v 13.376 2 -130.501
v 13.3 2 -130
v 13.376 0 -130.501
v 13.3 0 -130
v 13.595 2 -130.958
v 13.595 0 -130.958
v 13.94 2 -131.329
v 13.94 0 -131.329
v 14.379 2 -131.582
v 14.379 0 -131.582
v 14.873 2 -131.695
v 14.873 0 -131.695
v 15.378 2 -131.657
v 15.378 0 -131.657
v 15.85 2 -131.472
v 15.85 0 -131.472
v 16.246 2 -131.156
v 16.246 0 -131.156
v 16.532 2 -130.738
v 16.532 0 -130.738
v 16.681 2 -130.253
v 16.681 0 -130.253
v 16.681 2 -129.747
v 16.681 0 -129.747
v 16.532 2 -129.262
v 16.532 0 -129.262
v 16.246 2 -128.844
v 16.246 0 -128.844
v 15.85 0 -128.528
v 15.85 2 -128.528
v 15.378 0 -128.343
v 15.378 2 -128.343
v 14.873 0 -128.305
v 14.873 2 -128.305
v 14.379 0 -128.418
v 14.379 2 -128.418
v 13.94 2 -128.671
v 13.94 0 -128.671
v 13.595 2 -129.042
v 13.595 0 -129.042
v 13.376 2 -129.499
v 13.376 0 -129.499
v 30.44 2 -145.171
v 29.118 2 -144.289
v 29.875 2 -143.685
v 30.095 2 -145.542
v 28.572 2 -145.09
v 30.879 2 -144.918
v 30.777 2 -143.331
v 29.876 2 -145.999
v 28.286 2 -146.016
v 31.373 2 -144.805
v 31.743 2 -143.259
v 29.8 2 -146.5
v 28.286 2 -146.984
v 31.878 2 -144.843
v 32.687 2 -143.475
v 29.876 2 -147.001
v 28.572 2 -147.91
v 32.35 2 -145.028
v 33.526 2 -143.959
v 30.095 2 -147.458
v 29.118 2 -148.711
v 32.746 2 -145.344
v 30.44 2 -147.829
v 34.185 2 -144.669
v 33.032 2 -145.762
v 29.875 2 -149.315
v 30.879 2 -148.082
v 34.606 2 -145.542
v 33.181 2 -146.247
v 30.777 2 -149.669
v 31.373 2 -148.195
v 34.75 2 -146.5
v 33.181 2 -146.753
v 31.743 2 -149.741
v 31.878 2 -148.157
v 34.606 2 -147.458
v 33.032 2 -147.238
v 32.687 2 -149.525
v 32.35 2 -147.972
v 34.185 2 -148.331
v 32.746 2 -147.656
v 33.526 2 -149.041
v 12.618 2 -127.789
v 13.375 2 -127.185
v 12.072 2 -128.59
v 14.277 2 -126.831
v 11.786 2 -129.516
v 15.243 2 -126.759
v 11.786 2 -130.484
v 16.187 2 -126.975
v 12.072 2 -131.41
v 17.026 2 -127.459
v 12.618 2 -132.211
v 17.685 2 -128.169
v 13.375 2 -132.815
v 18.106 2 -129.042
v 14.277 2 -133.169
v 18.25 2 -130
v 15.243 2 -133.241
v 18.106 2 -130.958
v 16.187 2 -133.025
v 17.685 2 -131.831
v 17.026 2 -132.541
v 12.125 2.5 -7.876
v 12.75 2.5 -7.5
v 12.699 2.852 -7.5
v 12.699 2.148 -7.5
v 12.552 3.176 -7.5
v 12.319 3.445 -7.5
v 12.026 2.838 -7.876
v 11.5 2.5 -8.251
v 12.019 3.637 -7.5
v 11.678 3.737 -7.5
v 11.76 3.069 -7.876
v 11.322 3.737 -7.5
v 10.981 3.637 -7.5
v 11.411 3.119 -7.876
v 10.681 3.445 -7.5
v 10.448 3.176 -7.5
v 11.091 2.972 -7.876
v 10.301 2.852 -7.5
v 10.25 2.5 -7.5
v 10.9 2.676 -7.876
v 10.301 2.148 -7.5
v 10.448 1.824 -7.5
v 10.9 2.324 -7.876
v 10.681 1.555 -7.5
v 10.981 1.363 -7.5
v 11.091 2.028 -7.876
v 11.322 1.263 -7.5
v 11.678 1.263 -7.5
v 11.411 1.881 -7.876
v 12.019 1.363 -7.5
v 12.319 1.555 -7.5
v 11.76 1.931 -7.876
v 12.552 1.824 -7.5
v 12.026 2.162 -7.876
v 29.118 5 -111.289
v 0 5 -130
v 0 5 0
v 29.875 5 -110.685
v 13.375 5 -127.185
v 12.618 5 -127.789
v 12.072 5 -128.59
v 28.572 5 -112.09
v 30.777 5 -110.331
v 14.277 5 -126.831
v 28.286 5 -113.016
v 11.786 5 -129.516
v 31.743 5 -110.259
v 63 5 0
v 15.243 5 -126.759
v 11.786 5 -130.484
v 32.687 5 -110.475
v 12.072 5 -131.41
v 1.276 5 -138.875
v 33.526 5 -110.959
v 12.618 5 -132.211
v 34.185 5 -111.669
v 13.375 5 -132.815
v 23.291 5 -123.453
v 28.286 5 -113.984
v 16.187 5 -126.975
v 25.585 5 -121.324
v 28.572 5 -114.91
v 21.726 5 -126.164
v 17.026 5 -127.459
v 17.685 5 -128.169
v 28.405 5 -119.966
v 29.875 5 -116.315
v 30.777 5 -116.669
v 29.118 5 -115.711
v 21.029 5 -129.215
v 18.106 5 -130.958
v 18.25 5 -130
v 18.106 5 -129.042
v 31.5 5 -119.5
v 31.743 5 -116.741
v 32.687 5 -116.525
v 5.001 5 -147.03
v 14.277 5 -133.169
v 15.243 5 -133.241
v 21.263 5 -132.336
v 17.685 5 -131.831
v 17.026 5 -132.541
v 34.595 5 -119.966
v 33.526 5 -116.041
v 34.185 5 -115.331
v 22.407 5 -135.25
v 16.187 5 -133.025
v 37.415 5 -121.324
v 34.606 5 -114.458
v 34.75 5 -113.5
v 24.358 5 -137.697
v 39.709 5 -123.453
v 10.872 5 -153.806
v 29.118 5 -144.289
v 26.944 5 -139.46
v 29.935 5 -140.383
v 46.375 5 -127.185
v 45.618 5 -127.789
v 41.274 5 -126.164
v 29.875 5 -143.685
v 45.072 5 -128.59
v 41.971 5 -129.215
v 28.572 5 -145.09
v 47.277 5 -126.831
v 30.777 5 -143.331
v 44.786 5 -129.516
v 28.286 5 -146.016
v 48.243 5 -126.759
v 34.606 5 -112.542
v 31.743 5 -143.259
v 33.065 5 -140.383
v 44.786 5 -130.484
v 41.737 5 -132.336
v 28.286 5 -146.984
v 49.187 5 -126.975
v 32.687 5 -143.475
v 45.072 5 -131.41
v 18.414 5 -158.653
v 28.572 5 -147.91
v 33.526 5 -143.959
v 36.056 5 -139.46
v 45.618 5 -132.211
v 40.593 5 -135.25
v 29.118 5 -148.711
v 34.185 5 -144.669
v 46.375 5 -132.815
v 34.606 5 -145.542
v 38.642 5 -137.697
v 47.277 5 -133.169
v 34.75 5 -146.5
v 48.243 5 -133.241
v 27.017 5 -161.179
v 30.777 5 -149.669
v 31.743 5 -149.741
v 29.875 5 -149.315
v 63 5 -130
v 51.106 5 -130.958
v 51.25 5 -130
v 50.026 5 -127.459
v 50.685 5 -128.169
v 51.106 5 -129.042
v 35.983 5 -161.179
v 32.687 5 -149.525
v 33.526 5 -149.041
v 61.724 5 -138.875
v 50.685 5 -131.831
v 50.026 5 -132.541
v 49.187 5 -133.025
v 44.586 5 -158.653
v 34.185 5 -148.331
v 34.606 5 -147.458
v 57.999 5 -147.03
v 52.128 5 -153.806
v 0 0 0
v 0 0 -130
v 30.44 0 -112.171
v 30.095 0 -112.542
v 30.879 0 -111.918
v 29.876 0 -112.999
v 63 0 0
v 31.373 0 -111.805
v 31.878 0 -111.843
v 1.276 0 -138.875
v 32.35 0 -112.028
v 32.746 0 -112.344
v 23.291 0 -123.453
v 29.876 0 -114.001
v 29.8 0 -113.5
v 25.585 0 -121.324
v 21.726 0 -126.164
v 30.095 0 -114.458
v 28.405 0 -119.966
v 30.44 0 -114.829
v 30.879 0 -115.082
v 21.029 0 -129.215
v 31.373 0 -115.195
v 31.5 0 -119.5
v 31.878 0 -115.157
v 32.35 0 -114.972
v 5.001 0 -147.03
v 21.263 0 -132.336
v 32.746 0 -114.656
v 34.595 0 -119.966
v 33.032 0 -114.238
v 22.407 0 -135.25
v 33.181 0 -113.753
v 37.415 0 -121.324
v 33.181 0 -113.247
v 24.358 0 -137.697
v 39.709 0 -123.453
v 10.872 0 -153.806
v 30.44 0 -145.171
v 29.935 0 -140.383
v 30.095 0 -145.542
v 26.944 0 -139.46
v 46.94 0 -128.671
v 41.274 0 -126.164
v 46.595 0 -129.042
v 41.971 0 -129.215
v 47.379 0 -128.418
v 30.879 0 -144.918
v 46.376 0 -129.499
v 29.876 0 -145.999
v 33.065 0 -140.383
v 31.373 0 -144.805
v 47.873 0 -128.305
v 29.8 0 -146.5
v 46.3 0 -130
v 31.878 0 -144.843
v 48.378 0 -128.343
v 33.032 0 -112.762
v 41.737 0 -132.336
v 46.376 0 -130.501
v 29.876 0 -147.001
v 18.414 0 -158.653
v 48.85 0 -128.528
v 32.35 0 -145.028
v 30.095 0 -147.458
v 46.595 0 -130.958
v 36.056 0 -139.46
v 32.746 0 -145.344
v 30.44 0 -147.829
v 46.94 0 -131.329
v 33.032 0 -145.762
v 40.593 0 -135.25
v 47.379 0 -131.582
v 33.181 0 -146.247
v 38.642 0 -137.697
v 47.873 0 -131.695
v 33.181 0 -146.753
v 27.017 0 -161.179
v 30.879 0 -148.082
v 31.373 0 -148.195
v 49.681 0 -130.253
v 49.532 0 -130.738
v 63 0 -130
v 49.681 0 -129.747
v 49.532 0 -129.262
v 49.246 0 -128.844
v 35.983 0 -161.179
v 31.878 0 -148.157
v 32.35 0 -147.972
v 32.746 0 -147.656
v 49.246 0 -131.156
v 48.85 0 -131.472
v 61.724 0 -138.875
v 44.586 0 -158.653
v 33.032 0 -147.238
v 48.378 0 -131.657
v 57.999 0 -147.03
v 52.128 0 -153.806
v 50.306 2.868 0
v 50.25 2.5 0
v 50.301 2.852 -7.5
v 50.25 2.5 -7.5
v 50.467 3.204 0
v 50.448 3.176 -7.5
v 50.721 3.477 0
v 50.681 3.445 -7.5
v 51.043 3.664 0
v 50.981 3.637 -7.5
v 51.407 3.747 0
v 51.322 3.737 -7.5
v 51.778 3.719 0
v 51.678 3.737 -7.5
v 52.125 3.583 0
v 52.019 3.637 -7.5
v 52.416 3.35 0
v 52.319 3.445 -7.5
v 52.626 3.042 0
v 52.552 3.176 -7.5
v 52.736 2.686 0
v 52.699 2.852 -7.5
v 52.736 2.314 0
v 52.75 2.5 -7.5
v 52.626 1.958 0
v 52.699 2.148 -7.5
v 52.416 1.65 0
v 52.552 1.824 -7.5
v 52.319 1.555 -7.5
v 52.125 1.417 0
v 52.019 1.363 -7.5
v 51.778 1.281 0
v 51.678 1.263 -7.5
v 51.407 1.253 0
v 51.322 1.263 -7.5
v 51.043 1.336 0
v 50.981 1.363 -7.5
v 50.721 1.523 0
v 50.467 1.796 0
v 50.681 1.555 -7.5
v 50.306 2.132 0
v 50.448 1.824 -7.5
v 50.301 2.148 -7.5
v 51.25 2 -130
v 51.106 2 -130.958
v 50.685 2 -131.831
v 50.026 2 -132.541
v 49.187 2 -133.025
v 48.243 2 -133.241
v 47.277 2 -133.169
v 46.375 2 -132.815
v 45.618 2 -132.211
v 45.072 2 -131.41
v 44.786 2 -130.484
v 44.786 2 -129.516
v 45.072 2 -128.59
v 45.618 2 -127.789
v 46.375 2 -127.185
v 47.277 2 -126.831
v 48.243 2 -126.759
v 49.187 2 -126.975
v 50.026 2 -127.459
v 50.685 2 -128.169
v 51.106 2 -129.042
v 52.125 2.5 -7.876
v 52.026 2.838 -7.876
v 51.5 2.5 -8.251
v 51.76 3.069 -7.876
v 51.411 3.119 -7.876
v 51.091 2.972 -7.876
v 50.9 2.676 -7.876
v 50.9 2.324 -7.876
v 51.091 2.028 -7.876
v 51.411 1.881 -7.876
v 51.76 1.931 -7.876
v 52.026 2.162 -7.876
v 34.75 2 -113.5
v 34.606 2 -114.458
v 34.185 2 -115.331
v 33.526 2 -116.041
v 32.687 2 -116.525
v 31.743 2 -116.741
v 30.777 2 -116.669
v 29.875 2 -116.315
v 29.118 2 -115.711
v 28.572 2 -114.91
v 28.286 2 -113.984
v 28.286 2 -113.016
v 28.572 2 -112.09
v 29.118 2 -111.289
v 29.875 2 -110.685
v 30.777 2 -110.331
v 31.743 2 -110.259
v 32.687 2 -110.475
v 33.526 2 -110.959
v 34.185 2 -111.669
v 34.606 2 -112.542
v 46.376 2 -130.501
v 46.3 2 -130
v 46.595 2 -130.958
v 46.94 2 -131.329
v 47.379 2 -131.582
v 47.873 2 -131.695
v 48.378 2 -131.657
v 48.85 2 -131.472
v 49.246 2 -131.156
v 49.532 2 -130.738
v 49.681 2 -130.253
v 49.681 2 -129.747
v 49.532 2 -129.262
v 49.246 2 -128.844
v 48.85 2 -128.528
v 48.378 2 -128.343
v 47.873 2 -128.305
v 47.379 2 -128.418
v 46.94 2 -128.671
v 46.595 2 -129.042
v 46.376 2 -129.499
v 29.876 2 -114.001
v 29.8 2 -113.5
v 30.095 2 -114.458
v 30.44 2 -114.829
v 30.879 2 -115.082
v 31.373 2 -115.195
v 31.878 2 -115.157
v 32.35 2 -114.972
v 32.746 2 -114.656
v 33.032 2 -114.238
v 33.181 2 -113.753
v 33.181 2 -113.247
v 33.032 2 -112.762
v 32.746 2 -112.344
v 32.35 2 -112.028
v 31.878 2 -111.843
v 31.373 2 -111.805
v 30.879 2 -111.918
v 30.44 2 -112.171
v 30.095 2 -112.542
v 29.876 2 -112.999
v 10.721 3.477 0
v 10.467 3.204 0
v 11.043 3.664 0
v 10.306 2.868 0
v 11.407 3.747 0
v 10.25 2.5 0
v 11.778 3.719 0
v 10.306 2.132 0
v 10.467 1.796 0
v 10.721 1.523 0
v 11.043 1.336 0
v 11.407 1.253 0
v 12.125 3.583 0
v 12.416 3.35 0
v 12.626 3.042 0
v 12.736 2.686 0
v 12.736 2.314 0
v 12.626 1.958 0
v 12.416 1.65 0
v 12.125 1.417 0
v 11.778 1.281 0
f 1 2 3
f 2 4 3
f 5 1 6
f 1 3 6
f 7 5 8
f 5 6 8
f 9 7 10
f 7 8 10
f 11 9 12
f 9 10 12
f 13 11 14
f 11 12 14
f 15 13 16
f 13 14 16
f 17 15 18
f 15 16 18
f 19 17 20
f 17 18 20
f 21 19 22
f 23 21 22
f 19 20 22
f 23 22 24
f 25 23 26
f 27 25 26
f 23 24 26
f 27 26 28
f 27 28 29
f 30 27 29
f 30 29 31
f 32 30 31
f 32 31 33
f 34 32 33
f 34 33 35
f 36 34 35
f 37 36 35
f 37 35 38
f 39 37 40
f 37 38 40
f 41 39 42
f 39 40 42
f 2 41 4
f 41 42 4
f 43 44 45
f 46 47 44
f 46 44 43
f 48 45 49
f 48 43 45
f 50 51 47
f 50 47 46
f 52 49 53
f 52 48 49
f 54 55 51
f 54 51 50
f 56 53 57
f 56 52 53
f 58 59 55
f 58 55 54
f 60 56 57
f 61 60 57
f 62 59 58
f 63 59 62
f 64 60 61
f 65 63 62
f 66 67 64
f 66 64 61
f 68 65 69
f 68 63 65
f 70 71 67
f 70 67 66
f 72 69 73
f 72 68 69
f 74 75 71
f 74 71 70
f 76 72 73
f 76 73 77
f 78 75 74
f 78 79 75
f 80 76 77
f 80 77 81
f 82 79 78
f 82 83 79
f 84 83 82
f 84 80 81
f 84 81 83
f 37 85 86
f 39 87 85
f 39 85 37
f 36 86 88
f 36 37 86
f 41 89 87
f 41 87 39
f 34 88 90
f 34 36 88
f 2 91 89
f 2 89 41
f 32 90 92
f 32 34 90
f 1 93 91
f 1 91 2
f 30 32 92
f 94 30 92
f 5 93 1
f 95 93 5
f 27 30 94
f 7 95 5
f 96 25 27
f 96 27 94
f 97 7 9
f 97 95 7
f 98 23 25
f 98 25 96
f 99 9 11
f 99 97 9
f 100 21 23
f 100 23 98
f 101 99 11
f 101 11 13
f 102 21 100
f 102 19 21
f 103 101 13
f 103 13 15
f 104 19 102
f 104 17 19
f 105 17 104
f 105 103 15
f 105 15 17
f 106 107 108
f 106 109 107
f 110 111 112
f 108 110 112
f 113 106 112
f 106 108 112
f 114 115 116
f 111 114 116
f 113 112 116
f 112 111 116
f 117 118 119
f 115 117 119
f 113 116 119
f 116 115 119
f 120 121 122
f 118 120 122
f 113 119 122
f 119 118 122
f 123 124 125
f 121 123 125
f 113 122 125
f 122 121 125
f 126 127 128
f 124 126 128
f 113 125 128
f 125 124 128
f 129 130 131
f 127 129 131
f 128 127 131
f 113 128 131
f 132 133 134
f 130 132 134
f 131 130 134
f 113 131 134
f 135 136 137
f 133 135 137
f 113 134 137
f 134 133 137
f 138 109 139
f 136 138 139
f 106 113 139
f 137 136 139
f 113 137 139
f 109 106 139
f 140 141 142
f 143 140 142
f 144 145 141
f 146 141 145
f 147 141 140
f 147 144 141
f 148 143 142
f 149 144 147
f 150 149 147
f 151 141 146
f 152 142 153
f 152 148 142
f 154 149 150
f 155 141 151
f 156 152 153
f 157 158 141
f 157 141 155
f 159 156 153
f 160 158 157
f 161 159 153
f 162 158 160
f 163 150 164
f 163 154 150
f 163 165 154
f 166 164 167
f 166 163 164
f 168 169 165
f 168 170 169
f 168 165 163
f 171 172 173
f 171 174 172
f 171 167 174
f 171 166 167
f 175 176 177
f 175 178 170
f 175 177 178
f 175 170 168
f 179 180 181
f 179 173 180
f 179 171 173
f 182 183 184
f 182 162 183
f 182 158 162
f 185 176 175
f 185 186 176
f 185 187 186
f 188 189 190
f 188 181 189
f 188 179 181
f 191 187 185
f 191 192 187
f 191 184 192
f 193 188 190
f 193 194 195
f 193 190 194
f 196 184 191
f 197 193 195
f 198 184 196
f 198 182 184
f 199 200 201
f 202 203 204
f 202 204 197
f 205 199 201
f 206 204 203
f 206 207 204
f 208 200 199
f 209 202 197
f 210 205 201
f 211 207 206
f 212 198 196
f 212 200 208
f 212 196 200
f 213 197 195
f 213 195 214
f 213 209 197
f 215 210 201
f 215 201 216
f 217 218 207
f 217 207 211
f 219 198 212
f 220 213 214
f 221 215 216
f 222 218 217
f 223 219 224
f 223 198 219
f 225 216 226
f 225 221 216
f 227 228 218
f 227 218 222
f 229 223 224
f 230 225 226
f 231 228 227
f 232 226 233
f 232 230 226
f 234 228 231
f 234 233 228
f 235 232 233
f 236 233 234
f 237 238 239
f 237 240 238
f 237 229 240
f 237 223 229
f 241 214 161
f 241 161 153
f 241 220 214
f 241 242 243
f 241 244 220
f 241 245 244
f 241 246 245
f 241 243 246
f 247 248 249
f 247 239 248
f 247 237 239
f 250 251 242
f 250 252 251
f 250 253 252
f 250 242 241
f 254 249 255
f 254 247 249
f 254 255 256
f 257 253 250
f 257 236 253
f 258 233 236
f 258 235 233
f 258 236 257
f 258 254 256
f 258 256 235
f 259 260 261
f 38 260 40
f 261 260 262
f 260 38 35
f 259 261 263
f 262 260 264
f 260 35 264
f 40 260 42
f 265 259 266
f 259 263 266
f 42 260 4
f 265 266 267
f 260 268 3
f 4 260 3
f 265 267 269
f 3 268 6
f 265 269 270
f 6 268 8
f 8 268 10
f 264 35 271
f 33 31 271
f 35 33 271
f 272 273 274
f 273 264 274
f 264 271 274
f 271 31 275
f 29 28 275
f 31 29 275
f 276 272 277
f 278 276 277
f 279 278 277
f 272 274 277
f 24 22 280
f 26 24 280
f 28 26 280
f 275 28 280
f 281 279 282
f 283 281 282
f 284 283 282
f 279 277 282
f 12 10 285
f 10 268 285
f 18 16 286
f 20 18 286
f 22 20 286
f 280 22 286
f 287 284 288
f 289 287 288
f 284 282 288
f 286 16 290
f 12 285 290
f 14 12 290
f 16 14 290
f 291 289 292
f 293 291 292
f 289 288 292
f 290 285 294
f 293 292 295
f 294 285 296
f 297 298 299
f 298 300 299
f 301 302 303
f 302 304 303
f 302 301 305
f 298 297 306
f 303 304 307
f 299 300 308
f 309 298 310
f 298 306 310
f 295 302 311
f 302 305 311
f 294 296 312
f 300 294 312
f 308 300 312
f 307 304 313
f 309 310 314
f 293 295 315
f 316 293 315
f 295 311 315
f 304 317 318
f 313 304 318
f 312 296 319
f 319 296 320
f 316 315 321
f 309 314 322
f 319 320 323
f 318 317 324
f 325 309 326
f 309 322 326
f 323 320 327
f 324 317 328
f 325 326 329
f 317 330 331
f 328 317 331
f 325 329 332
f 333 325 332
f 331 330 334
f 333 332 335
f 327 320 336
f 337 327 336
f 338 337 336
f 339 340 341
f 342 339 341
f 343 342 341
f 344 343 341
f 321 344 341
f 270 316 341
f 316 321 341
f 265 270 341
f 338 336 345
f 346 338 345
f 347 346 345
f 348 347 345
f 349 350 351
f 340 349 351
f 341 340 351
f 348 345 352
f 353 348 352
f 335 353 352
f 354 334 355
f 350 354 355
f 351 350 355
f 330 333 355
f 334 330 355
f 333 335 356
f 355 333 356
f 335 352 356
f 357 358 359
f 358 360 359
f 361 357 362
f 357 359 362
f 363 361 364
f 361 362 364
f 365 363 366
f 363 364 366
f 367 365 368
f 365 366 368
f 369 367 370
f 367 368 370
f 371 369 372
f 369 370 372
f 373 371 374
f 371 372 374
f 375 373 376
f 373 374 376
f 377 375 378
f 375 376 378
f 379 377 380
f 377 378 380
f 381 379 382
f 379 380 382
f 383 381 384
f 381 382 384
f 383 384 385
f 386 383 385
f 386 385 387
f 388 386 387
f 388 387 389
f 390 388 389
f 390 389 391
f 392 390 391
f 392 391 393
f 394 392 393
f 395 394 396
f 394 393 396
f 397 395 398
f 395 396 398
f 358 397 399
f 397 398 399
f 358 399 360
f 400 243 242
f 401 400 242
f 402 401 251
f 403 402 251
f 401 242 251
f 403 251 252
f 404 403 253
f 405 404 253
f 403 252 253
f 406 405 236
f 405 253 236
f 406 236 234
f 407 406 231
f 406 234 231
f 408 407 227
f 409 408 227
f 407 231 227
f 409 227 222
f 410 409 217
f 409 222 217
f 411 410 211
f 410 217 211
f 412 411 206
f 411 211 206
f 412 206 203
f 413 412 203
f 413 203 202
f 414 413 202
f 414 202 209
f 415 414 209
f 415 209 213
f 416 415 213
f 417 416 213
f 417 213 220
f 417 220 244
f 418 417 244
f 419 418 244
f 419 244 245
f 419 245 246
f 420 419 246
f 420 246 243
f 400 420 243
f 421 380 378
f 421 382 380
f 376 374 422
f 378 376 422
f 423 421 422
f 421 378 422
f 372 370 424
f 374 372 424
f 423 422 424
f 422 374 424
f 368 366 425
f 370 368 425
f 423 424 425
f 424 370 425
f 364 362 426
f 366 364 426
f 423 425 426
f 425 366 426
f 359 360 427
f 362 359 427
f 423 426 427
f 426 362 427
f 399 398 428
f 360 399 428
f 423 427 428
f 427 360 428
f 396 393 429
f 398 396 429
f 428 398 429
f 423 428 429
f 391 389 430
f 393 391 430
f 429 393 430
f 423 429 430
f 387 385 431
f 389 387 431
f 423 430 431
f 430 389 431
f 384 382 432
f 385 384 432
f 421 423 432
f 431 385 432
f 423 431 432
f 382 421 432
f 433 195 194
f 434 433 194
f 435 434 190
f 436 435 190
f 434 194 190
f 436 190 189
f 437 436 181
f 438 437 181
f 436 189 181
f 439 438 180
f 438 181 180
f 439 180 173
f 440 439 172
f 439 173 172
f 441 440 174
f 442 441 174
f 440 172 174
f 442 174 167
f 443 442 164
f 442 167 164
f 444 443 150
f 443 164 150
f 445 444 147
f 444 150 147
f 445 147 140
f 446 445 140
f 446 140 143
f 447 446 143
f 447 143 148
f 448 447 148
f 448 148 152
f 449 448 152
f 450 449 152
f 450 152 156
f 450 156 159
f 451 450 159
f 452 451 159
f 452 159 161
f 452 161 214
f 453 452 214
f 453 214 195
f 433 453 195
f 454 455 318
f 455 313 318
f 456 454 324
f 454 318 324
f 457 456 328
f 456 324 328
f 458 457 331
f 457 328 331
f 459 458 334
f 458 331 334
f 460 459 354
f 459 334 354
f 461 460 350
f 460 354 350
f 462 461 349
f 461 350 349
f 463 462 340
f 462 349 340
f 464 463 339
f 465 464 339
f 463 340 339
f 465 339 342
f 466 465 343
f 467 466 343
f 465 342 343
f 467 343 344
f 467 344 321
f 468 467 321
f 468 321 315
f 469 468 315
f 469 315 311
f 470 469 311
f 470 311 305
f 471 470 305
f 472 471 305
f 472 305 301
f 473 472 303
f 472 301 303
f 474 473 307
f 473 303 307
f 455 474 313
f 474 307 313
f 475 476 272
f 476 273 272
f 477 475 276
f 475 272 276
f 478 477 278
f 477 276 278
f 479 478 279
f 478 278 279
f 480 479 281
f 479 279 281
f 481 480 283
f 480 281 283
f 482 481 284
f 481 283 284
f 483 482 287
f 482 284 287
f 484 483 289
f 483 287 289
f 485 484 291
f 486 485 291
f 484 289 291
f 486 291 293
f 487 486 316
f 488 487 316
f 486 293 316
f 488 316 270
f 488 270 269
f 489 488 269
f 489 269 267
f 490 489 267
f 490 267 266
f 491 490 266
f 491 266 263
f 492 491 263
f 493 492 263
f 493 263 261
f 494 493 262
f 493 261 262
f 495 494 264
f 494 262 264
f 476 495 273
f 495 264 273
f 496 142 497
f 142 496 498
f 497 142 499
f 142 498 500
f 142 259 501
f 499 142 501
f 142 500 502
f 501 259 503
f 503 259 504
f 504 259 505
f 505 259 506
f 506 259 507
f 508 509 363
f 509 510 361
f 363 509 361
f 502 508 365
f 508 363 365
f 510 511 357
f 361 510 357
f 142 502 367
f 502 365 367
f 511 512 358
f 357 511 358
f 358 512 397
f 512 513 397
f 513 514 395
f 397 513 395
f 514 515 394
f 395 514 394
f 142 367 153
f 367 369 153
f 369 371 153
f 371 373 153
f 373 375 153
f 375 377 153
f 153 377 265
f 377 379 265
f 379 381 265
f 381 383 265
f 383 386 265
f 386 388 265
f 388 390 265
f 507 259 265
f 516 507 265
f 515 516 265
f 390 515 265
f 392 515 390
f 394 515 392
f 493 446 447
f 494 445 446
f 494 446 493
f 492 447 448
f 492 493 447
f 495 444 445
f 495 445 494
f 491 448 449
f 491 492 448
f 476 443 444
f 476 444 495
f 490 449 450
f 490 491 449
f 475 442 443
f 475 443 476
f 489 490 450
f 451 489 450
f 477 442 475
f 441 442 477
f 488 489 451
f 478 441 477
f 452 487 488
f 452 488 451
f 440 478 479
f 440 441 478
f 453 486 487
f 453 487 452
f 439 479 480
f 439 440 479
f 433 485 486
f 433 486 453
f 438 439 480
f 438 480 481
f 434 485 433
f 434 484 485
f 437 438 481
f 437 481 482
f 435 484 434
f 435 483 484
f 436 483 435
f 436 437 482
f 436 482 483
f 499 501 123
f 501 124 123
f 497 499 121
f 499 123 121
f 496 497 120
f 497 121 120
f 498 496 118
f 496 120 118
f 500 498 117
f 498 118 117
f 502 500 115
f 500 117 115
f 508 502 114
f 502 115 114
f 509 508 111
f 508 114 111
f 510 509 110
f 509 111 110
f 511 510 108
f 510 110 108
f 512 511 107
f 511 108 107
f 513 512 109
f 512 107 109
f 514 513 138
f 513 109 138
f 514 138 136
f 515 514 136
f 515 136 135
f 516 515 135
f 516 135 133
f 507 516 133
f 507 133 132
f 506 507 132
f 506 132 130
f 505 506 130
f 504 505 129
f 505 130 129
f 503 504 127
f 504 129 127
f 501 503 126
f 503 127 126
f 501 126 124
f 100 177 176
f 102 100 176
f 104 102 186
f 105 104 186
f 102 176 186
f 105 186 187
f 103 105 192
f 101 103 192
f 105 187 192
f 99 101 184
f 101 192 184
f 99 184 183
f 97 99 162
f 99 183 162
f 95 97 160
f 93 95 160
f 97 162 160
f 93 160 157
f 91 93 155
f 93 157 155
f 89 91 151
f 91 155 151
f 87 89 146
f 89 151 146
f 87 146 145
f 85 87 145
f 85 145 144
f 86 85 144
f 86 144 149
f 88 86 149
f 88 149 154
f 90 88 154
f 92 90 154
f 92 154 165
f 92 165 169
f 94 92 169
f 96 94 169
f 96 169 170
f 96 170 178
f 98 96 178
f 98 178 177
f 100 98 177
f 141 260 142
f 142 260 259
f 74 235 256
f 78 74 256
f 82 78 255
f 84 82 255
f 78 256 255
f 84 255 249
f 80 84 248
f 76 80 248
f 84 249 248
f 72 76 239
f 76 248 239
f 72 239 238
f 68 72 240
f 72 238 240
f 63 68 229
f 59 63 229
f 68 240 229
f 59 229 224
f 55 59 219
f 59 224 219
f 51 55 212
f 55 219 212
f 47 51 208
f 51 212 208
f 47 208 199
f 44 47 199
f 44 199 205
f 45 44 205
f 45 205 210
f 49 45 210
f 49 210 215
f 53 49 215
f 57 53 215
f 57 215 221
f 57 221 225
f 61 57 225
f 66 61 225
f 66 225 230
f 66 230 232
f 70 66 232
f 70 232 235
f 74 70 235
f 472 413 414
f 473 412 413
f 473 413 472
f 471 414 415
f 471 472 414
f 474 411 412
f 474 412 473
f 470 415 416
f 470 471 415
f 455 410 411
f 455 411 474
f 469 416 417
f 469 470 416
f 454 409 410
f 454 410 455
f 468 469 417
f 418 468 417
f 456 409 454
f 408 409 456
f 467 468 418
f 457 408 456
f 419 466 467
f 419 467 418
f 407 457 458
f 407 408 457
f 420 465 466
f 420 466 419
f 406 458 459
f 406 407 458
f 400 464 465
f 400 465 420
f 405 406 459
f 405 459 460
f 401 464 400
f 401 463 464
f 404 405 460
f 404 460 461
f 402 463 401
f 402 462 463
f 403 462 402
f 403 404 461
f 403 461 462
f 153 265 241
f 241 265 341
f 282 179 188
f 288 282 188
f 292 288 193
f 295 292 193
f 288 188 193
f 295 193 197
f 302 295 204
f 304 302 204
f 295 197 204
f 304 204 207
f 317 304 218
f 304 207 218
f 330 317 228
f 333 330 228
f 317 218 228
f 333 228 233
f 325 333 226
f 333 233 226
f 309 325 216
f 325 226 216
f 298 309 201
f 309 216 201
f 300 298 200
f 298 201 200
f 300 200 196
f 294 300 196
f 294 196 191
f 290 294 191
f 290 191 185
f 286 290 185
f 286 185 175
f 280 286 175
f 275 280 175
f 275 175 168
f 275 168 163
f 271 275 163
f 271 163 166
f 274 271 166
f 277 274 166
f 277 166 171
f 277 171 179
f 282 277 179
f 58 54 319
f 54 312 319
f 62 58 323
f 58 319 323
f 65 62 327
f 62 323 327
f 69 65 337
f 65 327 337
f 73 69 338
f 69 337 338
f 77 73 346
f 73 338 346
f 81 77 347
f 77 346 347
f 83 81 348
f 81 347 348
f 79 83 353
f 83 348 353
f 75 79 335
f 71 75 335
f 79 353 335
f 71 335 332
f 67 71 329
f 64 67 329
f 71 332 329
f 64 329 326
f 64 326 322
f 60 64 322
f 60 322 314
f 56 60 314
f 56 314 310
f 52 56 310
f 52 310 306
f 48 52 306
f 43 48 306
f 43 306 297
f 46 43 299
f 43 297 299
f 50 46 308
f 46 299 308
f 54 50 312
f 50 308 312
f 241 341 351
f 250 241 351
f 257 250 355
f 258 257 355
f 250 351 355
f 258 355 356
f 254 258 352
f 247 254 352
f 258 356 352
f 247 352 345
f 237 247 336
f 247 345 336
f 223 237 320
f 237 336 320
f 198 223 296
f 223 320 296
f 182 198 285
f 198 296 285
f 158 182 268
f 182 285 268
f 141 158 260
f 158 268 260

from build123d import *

# Parameters (mm, degrees)
BOSS_EXTRUDE1_DEPTH            = 5
M3X0_5_TAPPED_HOLE1_D          = 2.5
M3X0_5_TAPPED_HOLE1_DEPTH      = 7.5
M3X0_5_TAPPED_HOLE1_TIP        = 0.751075774
CBORE_FOR_M3_SHCS1_D           = 3.4
CBORE_FOR_M3_SHCS1_CBORE_D     = 6.5
CBORE_FOR_M3_SHCS1_CBORE_DEPTH = 3
SKETCH6_R                      = 10.5
CUT_EXTRUDE1_DEPTH             = 174.42505586


with BuildPart() as part:
    # Sketch1 → Boss-Extrude1 (new body)
    with BuildSketch(Plane(origin=(0, 0, 0), x_dir=(1, 0, 0), z_dir=(0, 1, 0))):
        with BuildLine():
            Line((0, 0), (63, 0))
            Line((63, 0), (63, 130))
            ThreePointArc((63, 130), (31.5, 161.5), (0, 130))
            Line((0, 130), (0, 0))
        make_face()
    extrude(amount=BOSS_EXTRUDE1_DEPTH)

    # M3x0.5 Tapped Hole1
    with Locations(Plane.XY):
        with Locations((11.5, 2.5), (51.5, 2.5)):
            Hole(M3X0_5_TAPPED_HOLE1_D / 2, depth=M3X0_5_TAPPED_HOLE1_DEPTH)
            with Locations((0, 0, -(M3X0_5_TAPPED_HOLE1_DEPTH + M3X0_5_TAPPED_HOLE1_TIP / 2))):  # 118° drill point
                Cone(0, M3X0_5_TAPPED_HOLE1_D / 2, M3X0_5_TAPPED_HOLE1_TIP, mode=Mode.SUBTRACT)

    # CBORE for M3 SHCS1 (through all)
    with Locations(Plane(origin=(0, 5, 0), x_dir=(1, 0, 0), z_dir=(0, 1, 0))):
        with Locations((31.5, 113.5), (15, 130), (48, 130), (31.5, 146.5)):
            CounterBoreHole(CBORE_FOR_M3_SHCS1_D / 2, CBORE_FOR_M3_SHCS1_CBORE_D / 2, CBORE_FOR_M3_SHCS1_CBORE_DEPTH)

    # Sketch6 → Cut-Extrude1 (cut, through all)
    with BuildSketch(Plane(origin=(0, 5, 0), x_dir=(1, 0, 0), z_dir=(0, 1, 0))):
        with Locations(Location((31.5, 130, 0), (0, 0, 270))):
            Circle(SKETCH6_R)
    extrude(amount=-CUT_EXTRUDE1_DEPTH, mode=Mode.SUBTRACT)


solid = part.part
